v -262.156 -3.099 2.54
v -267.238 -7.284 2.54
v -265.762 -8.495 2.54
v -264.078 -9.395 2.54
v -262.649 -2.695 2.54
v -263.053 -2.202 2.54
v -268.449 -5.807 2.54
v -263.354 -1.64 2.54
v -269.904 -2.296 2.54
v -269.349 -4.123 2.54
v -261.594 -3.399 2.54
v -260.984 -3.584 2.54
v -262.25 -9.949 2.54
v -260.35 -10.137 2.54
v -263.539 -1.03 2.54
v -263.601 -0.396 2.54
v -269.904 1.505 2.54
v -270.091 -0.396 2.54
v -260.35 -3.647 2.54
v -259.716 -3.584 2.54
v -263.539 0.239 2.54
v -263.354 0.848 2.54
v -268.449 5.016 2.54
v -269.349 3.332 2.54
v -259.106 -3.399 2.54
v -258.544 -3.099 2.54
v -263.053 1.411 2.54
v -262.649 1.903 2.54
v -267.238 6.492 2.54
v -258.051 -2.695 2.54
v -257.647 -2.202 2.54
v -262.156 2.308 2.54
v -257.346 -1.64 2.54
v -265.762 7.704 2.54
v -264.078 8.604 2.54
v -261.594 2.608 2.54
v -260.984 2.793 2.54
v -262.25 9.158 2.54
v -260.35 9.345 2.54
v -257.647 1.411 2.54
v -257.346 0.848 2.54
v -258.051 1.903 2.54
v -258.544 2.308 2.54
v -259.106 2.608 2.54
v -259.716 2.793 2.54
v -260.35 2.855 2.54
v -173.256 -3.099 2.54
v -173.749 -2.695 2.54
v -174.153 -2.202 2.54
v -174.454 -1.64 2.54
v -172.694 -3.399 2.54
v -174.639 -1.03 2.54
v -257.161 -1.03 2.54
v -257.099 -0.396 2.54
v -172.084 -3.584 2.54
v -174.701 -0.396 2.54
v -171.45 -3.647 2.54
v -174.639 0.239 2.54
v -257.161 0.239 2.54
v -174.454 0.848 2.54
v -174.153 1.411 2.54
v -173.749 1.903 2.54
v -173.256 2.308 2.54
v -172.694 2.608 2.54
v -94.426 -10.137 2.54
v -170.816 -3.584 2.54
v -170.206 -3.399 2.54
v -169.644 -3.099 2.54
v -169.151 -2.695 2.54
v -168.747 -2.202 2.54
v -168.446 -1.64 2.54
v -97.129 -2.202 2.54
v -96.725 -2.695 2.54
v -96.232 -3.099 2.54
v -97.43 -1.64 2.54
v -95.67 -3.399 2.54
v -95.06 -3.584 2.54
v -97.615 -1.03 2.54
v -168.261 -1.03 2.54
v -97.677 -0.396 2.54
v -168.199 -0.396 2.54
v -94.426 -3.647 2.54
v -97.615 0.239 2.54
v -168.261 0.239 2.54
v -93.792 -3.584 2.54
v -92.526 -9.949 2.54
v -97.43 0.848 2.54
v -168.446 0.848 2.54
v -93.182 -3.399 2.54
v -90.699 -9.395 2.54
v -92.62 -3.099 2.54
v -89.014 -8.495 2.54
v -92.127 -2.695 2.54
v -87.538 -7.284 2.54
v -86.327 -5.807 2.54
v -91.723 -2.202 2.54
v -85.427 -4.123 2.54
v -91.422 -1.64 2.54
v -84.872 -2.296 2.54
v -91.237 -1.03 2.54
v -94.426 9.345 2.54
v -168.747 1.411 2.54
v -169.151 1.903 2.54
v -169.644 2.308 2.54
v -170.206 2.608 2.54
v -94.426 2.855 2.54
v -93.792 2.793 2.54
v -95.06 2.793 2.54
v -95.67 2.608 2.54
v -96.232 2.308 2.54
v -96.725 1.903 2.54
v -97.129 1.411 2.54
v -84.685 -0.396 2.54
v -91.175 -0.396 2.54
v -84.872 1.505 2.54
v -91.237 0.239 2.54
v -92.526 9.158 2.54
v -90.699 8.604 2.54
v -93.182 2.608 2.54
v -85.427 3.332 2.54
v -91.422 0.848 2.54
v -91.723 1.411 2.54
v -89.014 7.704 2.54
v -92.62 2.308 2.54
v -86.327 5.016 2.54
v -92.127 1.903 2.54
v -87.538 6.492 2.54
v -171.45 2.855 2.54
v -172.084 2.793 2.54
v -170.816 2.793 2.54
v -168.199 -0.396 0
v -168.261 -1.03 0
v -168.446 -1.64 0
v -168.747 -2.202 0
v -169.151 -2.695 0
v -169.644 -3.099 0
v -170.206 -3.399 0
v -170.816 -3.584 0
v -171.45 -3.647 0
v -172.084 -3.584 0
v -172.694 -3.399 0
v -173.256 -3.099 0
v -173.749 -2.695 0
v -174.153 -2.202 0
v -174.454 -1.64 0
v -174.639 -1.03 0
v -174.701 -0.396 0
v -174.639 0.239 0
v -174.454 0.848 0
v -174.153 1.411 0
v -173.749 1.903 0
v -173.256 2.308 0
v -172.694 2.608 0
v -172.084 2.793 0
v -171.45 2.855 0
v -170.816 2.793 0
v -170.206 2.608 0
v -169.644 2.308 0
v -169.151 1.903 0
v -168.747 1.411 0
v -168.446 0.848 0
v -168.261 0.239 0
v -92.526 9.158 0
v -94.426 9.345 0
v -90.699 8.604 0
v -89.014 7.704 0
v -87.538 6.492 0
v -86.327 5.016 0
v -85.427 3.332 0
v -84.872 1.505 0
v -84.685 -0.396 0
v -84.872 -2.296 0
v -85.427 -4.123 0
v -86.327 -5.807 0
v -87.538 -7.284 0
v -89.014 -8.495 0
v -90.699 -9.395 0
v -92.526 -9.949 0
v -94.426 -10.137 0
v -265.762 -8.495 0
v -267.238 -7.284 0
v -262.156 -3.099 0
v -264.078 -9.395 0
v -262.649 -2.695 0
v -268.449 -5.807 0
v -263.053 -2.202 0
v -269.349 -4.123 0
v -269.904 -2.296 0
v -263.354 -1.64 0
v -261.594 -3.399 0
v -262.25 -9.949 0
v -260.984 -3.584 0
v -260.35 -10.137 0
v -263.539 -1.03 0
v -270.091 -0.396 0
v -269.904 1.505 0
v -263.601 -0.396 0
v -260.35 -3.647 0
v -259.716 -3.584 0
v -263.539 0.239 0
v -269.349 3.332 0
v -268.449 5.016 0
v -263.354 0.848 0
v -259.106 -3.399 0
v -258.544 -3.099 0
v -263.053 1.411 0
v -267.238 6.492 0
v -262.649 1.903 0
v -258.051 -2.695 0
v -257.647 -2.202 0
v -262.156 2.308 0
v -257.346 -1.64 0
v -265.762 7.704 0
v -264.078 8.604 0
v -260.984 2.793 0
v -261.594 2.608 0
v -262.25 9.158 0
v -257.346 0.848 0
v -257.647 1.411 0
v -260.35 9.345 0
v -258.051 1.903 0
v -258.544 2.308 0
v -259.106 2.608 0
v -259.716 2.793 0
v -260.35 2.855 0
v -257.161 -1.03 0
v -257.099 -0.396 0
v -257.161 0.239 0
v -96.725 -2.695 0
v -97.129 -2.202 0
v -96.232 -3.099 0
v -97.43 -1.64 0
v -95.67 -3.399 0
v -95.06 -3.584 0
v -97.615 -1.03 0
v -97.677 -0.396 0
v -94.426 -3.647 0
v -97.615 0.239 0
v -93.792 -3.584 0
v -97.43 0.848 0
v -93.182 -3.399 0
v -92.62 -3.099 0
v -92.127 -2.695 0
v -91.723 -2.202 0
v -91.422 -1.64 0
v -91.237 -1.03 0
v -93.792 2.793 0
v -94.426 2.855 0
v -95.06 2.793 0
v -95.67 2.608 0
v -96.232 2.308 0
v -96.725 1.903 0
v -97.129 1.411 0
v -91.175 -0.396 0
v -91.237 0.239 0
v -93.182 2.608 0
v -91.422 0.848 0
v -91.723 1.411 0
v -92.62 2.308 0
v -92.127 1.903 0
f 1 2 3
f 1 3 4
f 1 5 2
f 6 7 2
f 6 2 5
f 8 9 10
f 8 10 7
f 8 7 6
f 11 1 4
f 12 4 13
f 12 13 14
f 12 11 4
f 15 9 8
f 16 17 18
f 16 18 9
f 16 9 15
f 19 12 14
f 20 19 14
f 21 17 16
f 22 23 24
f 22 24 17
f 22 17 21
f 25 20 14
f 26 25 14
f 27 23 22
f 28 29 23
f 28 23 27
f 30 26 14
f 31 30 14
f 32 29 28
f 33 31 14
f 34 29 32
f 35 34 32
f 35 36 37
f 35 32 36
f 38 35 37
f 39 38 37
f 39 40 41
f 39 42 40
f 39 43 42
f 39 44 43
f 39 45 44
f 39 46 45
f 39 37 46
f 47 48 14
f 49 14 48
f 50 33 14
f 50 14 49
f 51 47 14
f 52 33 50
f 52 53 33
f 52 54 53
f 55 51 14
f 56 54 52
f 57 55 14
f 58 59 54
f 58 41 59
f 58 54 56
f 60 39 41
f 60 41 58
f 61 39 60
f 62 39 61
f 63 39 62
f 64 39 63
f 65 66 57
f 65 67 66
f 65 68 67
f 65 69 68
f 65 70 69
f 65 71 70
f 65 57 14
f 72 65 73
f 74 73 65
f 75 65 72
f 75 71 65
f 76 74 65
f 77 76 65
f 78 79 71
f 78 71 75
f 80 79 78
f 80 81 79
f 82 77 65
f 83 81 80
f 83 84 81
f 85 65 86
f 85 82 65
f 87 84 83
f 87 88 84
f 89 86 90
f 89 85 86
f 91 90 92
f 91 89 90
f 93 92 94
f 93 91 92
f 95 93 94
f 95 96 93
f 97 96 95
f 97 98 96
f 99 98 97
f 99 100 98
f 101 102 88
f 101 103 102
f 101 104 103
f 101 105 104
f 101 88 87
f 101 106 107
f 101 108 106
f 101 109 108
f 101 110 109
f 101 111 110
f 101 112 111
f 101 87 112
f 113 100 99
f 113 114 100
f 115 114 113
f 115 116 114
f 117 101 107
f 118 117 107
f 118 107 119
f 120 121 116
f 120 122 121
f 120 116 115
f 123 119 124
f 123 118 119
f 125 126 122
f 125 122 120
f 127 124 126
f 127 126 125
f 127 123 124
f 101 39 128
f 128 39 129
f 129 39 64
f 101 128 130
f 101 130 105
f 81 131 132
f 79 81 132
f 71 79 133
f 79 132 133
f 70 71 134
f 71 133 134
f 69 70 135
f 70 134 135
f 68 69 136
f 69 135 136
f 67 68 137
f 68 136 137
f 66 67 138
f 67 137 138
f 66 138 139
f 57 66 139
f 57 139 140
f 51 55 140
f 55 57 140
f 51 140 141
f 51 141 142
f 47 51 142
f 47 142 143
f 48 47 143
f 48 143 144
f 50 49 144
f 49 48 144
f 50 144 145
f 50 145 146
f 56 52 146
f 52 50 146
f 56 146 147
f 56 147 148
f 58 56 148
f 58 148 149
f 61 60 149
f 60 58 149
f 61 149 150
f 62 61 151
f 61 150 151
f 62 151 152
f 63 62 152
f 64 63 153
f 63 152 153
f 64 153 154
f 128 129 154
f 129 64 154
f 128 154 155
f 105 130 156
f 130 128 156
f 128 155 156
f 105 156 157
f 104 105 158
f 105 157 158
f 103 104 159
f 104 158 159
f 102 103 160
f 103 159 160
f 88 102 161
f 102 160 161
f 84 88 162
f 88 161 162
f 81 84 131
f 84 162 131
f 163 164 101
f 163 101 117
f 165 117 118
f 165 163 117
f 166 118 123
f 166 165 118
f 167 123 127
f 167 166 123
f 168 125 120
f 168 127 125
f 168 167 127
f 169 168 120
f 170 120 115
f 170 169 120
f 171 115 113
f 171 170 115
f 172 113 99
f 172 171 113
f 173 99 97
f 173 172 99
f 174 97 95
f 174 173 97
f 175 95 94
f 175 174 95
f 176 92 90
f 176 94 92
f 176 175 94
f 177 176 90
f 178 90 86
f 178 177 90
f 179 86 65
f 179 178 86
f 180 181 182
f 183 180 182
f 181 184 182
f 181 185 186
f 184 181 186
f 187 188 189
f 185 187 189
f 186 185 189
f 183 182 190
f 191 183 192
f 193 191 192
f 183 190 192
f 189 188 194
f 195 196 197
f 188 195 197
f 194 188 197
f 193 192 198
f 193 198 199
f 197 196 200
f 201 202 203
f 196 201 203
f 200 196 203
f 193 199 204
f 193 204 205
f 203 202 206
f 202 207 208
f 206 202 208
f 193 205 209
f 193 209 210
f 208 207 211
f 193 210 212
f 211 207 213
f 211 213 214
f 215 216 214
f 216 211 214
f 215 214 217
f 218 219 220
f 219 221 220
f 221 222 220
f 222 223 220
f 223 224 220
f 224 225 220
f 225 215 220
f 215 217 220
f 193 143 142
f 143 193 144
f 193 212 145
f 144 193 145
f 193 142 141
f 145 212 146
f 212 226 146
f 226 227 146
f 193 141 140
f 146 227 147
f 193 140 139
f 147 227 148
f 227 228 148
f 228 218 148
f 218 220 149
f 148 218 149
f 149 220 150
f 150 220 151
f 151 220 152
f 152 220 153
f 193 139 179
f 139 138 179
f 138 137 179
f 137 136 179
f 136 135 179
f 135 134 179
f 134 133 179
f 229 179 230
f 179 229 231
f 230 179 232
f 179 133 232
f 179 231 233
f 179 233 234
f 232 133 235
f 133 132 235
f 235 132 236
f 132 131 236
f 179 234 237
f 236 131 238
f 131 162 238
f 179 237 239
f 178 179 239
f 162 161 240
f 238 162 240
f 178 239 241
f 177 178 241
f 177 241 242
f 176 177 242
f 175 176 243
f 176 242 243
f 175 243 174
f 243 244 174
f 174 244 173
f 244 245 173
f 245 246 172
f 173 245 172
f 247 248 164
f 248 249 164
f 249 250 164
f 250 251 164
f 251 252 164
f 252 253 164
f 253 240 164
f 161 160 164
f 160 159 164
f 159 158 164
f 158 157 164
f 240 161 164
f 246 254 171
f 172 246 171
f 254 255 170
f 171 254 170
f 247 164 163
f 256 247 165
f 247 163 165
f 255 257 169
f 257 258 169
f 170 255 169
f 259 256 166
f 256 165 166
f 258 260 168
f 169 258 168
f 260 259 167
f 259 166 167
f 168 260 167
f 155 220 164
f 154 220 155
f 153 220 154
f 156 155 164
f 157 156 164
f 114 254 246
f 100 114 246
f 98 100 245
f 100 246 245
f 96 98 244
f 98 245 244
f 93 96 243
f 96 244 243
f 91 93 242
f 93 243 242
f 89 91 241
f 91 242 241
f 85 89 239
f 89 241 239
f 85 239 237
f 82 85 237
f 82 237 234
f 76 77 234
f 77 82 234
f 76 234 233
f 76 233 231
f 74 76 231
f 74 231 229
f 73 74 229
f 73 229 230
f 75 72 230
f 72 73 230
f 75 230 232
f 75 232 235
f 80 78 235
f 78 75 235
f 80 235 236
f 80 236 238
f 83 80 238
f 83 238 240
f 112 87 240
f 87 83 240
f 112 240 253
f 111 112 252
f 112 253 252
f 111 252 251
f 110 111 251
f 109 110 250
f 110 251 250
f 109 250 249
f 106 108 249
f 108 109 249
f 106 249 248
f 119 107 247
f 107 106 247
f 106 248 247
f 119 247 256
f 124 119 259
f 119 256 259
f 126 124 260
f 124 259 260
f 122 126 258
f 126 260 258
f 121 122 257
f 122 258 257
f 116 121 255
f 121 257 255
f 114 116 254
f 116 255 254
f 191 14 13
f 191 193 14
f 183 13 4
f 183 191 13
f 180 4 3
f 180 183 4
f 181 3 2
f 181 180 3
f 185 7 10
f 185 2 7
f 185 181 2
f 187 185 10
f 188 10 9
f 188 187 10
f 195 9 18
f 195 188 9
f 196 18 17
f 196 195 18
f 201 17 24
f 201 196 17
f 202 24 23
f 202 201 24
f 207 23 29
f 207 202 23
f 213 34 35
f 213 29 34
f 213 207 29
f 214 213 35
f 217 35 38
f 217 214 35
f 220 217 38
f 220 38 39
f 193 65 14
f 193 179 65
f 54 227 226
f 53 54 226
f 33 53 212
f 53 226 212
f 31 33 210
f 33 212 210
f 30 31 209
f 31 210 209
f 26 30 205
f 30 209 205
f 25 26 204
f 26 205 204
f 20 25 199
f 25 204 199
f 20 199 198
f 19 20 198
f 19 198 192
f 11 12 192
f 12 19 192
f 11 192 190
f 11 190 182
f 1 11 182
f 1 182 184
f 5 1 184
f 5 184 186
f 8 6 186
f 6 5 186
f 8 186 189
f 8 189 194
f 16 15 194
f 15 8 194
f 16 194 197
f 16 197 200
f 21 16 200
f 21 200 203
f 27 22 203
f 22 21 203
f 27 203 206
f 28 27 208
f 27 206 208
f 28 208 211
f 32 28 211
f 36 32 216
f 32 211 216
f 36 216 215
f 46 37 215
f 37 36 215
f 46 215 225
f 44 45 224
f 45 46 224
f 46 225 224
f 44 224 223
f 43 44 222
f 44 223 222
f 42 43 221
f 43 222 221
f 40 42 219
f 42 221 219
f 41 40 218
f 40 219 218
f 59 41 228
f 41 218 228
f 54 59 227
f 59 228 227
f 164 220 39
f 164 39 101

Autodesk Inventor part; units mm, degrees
ref_plane "YZ Plane" through (0, 0, 0) normal (1, 0, 0) x (0, 1, 0)
ref_plane "XZ Plane" through (0, 0, 0) normal (0, 1, 0) x (-1, 0, 0)
ref_plane "XY Plane" through (0, 0, 0) normal (0, 0, 1) x (1, 0, 0)
sketch "Sketch1" plane through (0, 0, 0) normal (0, 0, 1) x (1, 0, 0)
  arc A0 (-94.4262, -10.1366) -> (-94.4262, 9.3452) centre (-94.4262, -0.3957) ccw
  arc A1 (-260.35, 9.3452) -> (-260.35, -10.1366) centre (-260.35, -0.3957) ccw
  line L0 (-260.35, 9.3452) -> (-94.4262, 9.3452)
  line L1 (-94.4262, -10.1366) -> (-260.35, -10.1366)
  circle A2 centre (-260.35, -0.3957) radius 3.2512
  circle A3 centre (-94.4262, -0.3957) radius 3.2512
  circle A4 centre (-171.45, -0.3957) radius 3.2512
  line L2 (-260.35, -0.3957) -> (-260.35, 9.3452) construction
  dimension "d0" = 19.4818
  dimension "d1" = 19.4818
  dimension "d3" = 6.5024
  dimension "d4" = 6.5024
  dimension "d12" = 6.5024
  dimension "d13" = 9.7409
  dimension "d14" = 88.9
  dimension "d19" = 90
extrude "Extrusion1" add sketch "Sketch1" along normal blind 2.54
equation "\"d0\" = d1"
properties part number "ArmConnector1"
